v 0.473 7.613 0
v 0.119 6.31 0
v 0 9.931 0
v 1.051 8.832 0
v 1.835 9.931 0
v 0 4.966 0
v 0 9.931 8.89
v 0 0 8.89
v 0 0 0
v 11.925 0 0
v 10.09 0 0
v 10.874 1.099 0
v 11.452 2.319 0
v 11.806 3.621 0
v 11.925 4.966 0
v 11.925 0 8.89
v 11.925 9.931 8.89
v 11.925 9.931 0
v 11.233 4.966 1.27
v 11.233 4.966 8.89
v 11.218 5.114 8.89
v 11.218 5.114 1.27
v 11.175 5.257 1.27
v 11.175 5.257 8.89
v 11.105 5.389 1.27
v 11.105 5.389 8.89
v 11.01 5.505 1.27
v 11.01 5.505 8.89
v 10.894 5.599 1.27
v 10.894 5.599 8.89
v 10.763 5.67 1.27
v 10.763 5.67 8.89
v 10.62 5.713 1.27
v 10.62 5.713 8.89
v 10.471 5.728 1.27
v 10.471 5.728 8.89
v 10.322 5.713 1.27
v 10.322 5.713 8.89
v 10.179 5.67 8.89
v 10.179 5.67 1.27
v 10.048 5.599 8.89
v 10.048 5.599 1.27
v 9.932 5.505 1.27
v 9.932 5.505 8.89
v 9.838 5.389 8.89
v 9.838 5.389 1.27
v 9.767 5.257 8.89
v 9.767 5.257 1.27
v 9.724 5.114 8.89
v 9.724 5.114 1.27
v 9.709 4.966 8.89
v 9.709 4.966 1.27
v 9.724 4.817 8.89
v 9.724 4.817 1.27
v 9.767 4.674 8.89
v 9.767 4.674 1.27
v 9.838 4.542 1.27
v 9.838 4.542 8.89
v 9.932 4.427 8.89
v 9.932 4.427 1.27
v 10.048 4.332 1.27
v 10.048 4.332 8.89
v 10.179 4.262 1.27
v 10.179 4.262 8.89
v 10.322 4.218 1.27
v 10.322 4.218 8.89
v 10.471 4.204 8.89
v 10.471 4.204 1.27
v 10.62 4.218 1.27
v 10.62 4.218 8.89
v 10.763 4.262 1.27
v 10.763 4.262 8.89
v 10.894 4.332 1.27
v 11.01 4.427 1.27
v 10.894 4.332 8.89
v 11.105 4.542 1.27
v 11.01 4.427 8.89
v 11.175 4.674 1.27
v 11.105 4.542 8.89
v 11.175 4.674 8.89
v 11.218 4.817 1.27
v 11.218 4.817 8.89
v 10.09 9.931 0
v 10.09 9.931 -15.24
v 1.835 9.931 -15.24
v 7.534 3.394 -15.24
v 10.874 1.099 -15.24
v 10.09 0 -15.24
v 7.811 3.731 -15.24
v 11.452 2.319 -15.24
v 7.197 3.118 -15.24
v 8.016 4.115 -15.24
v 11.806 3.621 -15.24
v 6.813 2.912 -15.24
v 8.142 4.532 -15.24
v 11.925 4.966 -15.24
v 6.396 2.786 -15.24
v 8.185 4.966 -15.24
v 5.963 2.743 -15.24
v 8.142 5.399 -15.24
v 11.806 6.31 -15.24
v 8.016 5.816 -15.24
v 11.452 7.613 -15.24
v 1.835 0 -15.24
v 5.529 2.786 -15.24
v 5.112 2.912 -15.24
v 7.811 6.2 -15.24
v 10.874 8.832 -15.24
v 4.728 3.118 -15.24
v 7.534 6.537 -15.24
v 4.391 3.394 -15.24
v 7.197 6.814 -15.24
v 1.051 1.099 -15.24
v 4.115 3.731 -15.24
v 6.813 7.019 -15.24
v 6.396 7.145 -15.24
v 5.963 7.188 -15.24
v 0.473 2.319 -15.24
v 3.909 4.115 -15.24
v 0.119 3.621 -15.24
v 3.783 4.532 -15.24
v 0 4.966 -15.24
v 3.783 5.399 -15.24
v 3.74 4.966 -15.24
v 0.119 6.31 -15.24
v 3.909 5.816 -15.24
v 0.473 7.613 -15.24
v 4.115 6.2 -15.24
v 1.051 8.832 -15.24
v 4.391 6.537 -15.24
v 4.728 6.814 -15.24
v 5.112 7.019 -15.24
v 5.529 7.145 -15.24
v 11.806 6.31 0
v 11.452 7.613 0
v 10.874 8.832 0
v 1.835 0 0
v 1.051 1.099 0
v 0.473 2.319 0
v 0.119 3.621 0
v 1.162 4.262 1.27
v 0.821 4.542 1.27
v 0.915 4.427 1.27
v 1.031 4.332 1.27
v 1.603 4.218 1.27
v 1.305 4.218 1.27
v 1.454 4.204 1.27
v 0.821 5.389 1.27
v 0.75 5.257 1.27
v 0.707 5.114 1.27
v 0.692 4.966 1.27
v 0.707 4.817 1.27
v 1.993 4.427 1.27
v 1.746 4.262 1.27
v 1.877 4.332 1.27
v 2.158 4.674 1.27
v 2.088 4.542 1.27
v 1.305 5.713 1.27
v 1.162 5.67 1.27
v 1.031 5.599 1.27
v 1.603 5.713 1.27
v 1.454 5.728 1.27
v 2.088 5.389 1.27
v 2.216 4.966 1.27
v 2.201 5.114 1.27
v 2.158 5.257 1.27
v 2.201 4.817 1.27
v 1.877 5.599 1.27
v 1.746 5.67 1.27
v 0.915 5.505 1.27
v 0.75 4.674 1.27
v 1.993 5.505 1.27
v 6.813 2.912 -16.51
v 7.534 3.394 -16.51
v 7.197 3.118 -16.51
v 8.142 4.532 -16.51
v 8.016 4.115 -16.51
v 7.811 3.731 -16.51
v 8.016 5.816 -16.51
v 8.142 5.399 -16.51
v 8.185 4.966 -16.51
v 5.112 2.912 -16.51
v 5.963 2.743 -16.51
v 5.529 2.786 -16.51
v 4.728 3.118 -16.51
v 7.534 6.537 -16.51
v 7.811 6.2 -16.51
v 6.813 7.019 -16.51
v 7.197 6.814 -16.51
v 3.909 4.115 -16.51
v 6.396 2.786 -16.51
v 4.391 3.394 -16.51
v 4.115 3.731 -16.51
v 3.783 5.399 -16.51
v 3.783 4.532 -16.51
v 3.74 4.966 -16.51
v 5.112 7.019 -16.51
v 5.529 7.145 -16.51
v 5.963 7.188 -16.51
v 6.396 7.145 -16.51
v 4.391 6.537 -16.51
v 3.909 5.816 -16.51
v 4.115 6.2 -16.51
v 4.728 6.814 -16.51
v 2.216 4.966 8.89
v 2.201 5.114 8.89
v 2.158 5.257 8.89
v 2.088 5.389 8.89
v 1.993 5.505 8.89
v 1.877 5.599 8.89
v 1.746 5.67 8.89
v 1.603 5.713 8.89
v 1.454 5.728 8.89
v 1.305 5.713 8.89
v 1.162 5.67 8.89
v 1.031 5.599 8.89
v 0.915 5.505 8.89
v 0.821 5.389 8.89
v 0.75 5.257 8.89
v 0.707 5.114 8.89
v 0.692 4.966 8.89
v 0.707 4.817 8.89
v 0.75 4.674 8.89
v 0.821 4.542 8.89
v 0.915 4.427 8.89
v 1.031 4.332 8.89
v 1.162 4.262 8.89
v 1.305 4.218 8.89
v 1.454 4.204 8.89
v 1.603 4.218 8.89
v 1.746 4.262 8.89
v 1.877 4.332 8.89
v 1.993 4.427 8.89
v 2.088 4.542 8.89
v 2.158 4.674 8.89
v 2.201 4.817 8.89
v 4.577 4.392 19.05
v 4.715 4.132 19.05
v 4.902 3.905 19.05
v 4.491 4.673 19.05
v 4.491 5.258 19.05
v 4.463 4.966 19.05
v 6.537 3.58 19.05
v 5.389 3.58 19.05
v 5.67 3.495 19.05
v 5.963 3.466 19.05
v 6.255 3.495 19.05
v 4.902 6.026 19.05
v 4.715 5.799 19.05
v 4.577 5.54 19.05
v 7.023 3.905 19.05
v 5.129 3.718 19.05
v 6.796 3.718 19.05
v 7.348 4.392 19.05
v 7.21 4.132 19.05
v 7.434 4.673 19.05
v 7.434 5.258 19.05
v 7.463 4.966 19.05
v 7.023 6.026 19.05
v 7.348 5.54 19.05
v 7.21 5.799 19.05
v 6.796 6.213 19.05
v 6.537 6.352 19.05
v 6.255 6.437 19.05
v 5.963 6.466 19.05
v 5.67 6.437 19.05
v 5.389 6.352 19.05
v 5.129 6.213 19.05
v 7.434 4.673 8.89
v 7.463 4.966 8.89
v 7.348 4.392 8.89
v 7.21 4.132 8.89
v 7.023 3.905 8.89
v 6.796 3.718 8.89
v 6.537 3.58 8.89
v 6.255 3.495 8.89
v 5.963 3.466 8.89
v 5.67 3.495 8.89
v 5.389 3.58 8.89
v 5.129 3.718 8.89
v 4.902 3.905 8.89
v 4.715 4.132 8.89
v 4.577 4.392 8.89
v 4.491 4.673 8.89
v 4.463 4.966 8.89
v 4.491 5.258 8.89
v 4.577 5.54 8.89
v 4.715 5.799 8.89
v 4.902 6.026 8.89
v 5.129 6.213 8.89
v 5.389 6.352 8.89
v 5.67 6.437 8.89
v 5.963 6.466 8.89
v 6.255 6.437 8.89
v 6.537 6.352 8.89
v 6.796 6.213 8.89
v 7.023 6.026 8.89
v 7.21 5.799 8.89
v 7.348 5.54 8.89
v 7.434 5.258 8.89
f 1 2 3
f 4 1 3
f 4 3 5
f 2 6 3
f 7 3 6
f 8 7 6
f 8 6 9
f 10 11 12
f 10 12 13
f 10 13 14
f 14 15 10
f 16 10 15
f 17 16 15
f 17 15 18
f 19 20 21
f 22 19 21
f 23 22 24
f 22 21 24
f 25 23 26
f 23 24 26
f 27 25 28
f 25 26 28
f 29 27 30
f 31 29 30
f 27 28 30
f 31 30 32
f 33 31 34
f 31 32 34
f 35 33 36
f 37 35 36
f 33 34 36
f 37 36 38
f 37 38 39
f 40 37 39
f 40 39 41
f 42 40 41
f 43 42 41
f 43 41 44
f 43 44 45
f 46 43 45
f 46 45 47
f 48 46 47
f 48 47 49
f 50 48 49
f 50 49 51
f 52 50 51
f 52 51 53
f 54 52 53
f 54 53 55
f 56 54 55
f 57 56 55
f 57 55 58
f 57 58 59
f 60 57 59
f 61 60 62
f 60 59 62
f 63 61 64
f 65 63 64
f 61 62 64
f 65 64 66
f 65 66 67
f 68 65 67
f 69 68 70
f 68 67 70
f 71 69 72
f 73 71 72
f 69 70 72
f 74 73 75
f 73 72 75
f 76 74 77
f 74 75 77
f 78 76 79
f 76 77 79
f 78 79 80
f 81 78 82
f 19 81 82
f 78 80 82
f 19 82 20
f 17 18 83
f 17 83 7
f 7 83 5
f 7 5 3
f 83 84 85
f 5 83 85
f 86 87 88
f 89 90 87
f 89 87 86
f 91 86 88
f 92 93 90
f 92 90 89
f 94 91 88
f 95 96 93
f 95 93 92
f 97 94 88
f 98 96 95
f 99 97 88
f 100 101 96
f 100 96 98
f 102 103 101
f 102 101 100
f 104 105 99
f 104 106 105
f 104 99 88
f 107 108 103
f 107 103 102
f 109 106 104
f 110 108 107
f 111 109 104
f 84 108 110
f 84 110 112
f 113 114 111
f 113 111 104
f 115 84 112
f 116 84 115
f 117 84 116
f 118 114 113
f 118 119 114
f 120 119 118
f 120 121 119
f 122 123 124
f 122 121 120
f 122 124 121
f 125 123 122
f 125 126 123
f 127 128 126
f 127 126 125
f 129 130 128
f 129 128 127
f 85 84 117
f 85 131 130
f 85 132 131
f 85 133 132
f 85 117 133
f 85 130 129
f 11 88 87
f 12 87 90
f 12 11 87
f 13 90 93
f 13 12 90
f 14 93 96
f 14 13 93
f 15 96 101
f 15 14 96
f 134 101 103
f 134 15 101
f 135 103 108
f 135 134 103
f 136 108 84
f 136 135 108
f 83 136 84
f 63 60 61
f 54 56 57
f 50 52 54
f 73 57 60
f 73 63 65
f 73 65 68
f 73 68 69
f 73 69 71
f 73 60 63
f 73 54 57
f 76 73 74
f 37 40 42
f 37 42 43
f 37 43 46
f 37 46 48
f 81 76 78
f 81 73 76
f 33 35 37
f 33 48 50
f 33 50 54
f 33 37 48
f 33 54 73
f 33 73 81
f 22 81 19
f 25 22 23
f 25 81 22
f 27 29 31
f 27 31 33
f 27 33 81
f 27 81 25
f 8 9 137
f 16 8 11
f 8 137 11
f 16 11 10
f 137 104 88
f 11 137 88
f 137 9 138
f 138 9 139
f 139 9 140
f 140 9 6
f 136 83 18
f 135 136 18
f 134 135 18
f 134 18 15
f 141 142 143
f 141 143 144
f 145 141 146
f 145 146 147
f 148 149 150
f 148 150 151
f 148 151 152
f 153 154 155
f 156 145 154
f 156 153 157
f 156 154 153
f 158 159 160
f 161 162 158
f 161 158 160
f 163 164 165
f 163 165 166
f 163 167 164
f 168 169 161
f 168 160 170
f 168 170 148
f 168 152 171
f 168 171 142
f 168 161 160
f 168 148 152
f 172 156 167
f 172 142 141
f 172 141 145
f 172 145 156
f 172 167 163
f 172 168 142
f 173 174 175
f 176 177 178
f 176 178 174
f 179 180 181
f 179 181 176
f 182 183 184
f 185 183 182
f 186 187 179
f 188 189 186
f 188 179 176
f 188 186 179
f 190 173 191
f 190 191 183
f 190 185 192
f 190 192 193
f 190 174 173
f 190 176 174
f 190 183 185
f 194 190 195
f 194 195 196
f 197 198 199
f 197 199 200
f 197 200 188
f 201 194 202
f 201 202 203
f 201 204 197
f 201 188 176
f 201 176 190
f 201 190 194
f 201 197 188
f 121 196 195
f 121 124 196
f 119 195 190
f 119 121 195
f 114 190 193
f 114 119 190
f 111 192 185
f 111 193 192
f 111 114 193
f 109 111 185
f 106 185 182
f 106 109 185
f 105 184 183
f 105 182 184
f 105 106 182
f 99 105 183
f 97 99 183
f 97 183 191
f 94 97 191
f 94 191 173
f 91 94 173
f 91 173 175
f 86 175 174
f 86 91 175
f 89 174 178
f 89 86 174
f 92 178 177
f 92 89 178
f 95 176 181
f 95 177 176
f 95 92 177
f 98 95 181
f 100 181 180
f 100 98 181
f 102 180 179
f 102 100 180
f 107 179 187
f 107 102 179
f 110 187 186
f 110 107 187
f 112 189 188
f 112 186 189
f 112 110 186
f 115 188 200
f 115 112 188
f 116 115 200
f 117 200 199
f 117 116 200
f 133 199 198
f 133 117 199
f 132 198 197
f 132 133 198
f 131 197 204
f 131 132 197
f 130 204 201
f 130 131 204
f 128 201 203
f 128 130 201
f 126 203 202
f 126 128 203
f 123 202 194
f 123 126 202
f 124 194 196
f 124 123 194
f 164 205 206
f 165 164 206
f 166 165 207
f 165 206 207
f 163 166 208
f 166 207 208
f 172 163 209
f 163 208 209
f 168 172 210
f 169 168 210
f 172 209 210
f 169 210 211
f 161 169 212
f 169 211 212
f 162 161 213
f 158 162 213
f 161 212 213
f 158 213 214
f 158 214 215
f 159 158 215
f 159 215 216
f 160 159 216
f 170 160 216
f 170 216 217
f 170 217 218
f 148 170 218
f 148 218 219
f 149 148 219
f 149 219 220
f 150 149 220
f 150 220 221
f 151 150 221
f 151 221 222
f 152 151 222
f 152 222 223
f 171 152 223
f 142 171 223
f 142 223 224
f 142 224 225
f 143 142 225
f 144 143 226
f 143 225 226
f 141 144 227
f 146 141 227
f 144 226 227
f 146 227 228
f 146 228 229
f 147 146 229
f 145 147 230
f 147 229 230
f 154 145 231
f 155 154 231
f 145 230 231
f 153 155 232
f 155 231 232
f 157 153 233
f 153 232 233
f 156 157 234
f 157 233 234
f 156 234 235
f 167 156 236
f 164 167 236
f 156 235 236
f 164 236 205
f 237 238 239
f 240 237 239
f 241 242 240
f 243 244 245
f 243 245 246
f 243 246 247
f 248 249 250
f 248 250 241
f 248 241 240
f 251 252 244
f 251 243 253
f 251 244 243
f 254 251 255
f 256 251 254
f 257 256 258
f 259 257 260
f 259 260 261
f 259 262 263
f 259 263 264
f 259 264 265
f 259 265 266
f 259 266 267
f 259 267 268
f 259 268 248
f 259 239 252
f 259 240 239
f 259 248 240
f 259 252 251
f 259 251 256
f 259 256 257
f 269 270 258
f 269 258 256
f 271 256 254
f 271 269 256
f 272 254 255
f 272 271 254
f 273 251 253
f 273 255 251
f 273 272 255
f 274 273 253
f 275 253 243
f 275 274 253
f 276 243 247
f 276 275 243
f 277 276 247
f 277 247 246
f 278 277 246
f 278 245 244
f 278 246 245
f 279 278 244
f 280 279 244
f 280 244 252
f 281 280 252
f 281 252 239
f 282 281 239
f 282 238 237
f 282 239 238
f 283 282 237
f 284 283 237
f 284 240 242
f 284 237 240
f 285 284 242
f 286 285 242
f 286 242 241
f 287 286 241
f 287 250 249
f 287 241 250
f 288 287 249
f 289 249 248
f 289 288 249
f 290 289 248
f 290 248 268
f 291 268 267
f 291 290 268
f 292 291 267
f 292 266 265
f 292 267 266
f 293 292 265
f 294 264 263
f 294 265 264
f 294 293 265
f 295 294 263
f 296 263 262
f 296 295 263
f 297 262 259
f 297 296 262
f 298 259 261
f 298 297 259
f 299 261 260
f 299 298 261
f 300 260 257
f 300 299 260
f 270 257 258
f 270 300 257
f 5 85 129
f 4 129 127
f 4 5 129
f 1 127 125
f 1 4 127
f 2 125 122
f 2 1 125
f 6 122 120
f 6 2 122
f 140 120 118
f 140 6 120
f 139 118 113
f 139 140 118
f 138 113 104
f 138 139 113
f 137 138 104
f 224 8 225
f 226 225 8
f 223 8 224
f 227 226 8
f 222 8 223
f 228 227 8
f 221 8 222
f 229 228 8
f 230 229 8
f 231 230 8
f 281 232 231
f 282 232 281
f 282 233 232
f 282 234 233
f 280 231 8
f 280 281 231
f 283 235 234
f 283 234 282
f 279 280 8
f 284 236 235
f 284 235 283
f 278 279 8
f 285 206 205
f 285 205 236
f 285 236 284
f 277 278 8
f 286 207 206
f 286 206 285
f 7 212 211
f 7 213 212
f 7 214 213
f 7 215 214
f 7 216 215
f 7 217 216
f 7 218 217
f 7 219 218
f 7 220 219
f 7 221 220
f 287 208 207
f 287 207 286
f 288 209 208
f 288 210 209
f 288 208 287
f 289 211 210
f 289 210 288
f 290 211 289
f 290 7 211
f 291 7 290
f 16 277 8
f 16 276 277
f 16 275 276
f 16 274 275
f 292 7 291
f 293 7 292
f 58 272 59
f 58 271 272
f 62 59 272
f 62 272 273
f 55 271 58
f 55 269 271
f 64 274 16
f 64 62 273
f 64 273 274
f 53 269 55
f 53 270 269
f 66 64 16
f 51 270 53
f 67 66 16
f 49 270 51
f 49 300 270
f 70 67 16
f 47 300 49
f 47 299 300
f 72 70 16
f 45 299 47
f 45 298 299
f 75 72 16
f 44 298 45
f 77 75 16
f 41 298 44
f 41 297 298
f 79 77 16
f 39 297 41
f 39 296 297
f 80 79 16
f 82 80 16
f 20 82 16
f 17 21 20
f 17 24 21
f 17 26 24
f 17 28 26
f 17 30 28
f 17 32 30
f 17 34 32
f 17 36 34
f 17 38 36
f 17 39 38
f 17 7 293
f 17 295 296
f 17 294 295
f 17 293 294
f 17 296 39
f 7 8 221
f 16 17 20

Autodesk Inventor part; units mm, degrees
ref_plane "YZ Plane" through (0, 0, 0) normal (1, 0, 0) x (0, 1, 0)
ref_plane "XZ Plane" through (0, 0, 0) normal (0, 1, 0) x (-1, 0, 0)
ref_plane "XY Plane" through (0, 0, 0) normal (0, 0, 1) x (1, 0, 0)
sketch "Sketch1" plane through (0, 0, 0) normal (0, 0, 1) x (1, 0, 0)
  line L0 (0, 0) -> (11.9253, 0)
  line L1 (11.9253, 0) -> (11.9253, 9.9314)
  line L2 (11.9253, 9.9314) -> (0, 9.9314)
  line L3 (0, 9.9314) -> (0, 0)
  dimension "d0" = 11.9253
  dimension "d1" = 9.9314
extrude "Extrusion1" add sketch "Sketch1" along normal blind 8.89
sketch "Sketch2" plane through (0, 0, 8.89) normal (0, 0, 1) x (1, 0, 0)
  circle A0 centre (5.9626, 4.9657) radius 1.5
  line L0 (11.9253, 9.9314) -> (0, 9.9314) construction
  line L1 (0, 9.9314) -> (0, 0) construction
  point P0 (5.9626, 9.9314)
  point P1 (0, 4.9657)
  dimension "d4" = 3
extrude "Extrusion2" add sketch "Sketch2" along normal blind 10.16
sketch "Sketch3" plane through (0, 0, 8.89) normal (0, 0, 1) x (1, 0, 0)
  circle A0 centre (10.4711, 4.9657) radius 0.762
  circle A1 centre (1.4541, 4.9657) radius 0.762
  line L0 (1.4541, 4.9657) -> (0, 4.9657) construction
  line L1 (0, 9.9314) -> (0, 0) construction
  line L2 (10.4711, 4.9657) -> (11.9253, 4.9657) construction
  line L3 (11.9253, 0) -> (11.9253, 9.9314) construction
  dimension "d7" = 9.017
  dimension "d8" = 1.524
extrude "Extrusion3" cut sketch "Sketch3" against normal blind 7.62
sketch "Sketch4" plane through (0, 0, 0) normal (0, 0, -1) x (-1, 0, 0)
  line L0 (0, 0) -> (-11.9253, 0) construction
  line L1 (0, 9.9314) -> (0, 0) construction
  line L2 (-11.9253, 9.9314) -> (0, 9.9314) construction
  line L3 (-11.9253, 0) -> (-11.9253, 9.9314) construction
  line L4 (-11.9253, 9.9314) -> (0, 9.9314) projected
  line L5 (-1.8351, 9.9314) -> (-10.0901, 9.9314)
  line L6 (0, 0) -> (-11.9253, 0) projected
  line L7 (-1.8351, 0) -> (-10.0901, 0)
  arc A0 (-10.0901, 9.9314) -> (-10.0901, 0) centre (-4.2894, 4.9657) ccw
  arc A1 (-1.8351, 0) -> (-1.8351, 9.9314) centre (-7.6359, 4.9657) ccw
  line L8 (0, 9.9314) -> (0, 0) projected
  line L9 (-11.9253, 0) -> (-11.9253, 9.9314) projected
  dimension "d11" = 8.255
extrude "Extrusion4" add sketch "Sketch4" along normal blind 15.24 contours L4 A1 L6 A0
sketch "Sketch5" plane through (0, 0, -15.24) normal (0, 0, -1) x (-1, 0, 0)
  circle A0 centre (-5.9626, 4.9657) radius 1.5 construction
  circle A1 centre (-5.9626, 4.9657) radius 1.5 projected
  circle A2 centre (-5.9626, 4.9657) radius 2.2225
  point P0 (0, 0)
  dimension "d14" = 4.445
extrude "Extrusion5" add sketch "Sketch5" along normal blind 1.27 contours A1 | A2
properties part number "MicroGearMotor" material "Brass, Soft Yellow, Welded"
